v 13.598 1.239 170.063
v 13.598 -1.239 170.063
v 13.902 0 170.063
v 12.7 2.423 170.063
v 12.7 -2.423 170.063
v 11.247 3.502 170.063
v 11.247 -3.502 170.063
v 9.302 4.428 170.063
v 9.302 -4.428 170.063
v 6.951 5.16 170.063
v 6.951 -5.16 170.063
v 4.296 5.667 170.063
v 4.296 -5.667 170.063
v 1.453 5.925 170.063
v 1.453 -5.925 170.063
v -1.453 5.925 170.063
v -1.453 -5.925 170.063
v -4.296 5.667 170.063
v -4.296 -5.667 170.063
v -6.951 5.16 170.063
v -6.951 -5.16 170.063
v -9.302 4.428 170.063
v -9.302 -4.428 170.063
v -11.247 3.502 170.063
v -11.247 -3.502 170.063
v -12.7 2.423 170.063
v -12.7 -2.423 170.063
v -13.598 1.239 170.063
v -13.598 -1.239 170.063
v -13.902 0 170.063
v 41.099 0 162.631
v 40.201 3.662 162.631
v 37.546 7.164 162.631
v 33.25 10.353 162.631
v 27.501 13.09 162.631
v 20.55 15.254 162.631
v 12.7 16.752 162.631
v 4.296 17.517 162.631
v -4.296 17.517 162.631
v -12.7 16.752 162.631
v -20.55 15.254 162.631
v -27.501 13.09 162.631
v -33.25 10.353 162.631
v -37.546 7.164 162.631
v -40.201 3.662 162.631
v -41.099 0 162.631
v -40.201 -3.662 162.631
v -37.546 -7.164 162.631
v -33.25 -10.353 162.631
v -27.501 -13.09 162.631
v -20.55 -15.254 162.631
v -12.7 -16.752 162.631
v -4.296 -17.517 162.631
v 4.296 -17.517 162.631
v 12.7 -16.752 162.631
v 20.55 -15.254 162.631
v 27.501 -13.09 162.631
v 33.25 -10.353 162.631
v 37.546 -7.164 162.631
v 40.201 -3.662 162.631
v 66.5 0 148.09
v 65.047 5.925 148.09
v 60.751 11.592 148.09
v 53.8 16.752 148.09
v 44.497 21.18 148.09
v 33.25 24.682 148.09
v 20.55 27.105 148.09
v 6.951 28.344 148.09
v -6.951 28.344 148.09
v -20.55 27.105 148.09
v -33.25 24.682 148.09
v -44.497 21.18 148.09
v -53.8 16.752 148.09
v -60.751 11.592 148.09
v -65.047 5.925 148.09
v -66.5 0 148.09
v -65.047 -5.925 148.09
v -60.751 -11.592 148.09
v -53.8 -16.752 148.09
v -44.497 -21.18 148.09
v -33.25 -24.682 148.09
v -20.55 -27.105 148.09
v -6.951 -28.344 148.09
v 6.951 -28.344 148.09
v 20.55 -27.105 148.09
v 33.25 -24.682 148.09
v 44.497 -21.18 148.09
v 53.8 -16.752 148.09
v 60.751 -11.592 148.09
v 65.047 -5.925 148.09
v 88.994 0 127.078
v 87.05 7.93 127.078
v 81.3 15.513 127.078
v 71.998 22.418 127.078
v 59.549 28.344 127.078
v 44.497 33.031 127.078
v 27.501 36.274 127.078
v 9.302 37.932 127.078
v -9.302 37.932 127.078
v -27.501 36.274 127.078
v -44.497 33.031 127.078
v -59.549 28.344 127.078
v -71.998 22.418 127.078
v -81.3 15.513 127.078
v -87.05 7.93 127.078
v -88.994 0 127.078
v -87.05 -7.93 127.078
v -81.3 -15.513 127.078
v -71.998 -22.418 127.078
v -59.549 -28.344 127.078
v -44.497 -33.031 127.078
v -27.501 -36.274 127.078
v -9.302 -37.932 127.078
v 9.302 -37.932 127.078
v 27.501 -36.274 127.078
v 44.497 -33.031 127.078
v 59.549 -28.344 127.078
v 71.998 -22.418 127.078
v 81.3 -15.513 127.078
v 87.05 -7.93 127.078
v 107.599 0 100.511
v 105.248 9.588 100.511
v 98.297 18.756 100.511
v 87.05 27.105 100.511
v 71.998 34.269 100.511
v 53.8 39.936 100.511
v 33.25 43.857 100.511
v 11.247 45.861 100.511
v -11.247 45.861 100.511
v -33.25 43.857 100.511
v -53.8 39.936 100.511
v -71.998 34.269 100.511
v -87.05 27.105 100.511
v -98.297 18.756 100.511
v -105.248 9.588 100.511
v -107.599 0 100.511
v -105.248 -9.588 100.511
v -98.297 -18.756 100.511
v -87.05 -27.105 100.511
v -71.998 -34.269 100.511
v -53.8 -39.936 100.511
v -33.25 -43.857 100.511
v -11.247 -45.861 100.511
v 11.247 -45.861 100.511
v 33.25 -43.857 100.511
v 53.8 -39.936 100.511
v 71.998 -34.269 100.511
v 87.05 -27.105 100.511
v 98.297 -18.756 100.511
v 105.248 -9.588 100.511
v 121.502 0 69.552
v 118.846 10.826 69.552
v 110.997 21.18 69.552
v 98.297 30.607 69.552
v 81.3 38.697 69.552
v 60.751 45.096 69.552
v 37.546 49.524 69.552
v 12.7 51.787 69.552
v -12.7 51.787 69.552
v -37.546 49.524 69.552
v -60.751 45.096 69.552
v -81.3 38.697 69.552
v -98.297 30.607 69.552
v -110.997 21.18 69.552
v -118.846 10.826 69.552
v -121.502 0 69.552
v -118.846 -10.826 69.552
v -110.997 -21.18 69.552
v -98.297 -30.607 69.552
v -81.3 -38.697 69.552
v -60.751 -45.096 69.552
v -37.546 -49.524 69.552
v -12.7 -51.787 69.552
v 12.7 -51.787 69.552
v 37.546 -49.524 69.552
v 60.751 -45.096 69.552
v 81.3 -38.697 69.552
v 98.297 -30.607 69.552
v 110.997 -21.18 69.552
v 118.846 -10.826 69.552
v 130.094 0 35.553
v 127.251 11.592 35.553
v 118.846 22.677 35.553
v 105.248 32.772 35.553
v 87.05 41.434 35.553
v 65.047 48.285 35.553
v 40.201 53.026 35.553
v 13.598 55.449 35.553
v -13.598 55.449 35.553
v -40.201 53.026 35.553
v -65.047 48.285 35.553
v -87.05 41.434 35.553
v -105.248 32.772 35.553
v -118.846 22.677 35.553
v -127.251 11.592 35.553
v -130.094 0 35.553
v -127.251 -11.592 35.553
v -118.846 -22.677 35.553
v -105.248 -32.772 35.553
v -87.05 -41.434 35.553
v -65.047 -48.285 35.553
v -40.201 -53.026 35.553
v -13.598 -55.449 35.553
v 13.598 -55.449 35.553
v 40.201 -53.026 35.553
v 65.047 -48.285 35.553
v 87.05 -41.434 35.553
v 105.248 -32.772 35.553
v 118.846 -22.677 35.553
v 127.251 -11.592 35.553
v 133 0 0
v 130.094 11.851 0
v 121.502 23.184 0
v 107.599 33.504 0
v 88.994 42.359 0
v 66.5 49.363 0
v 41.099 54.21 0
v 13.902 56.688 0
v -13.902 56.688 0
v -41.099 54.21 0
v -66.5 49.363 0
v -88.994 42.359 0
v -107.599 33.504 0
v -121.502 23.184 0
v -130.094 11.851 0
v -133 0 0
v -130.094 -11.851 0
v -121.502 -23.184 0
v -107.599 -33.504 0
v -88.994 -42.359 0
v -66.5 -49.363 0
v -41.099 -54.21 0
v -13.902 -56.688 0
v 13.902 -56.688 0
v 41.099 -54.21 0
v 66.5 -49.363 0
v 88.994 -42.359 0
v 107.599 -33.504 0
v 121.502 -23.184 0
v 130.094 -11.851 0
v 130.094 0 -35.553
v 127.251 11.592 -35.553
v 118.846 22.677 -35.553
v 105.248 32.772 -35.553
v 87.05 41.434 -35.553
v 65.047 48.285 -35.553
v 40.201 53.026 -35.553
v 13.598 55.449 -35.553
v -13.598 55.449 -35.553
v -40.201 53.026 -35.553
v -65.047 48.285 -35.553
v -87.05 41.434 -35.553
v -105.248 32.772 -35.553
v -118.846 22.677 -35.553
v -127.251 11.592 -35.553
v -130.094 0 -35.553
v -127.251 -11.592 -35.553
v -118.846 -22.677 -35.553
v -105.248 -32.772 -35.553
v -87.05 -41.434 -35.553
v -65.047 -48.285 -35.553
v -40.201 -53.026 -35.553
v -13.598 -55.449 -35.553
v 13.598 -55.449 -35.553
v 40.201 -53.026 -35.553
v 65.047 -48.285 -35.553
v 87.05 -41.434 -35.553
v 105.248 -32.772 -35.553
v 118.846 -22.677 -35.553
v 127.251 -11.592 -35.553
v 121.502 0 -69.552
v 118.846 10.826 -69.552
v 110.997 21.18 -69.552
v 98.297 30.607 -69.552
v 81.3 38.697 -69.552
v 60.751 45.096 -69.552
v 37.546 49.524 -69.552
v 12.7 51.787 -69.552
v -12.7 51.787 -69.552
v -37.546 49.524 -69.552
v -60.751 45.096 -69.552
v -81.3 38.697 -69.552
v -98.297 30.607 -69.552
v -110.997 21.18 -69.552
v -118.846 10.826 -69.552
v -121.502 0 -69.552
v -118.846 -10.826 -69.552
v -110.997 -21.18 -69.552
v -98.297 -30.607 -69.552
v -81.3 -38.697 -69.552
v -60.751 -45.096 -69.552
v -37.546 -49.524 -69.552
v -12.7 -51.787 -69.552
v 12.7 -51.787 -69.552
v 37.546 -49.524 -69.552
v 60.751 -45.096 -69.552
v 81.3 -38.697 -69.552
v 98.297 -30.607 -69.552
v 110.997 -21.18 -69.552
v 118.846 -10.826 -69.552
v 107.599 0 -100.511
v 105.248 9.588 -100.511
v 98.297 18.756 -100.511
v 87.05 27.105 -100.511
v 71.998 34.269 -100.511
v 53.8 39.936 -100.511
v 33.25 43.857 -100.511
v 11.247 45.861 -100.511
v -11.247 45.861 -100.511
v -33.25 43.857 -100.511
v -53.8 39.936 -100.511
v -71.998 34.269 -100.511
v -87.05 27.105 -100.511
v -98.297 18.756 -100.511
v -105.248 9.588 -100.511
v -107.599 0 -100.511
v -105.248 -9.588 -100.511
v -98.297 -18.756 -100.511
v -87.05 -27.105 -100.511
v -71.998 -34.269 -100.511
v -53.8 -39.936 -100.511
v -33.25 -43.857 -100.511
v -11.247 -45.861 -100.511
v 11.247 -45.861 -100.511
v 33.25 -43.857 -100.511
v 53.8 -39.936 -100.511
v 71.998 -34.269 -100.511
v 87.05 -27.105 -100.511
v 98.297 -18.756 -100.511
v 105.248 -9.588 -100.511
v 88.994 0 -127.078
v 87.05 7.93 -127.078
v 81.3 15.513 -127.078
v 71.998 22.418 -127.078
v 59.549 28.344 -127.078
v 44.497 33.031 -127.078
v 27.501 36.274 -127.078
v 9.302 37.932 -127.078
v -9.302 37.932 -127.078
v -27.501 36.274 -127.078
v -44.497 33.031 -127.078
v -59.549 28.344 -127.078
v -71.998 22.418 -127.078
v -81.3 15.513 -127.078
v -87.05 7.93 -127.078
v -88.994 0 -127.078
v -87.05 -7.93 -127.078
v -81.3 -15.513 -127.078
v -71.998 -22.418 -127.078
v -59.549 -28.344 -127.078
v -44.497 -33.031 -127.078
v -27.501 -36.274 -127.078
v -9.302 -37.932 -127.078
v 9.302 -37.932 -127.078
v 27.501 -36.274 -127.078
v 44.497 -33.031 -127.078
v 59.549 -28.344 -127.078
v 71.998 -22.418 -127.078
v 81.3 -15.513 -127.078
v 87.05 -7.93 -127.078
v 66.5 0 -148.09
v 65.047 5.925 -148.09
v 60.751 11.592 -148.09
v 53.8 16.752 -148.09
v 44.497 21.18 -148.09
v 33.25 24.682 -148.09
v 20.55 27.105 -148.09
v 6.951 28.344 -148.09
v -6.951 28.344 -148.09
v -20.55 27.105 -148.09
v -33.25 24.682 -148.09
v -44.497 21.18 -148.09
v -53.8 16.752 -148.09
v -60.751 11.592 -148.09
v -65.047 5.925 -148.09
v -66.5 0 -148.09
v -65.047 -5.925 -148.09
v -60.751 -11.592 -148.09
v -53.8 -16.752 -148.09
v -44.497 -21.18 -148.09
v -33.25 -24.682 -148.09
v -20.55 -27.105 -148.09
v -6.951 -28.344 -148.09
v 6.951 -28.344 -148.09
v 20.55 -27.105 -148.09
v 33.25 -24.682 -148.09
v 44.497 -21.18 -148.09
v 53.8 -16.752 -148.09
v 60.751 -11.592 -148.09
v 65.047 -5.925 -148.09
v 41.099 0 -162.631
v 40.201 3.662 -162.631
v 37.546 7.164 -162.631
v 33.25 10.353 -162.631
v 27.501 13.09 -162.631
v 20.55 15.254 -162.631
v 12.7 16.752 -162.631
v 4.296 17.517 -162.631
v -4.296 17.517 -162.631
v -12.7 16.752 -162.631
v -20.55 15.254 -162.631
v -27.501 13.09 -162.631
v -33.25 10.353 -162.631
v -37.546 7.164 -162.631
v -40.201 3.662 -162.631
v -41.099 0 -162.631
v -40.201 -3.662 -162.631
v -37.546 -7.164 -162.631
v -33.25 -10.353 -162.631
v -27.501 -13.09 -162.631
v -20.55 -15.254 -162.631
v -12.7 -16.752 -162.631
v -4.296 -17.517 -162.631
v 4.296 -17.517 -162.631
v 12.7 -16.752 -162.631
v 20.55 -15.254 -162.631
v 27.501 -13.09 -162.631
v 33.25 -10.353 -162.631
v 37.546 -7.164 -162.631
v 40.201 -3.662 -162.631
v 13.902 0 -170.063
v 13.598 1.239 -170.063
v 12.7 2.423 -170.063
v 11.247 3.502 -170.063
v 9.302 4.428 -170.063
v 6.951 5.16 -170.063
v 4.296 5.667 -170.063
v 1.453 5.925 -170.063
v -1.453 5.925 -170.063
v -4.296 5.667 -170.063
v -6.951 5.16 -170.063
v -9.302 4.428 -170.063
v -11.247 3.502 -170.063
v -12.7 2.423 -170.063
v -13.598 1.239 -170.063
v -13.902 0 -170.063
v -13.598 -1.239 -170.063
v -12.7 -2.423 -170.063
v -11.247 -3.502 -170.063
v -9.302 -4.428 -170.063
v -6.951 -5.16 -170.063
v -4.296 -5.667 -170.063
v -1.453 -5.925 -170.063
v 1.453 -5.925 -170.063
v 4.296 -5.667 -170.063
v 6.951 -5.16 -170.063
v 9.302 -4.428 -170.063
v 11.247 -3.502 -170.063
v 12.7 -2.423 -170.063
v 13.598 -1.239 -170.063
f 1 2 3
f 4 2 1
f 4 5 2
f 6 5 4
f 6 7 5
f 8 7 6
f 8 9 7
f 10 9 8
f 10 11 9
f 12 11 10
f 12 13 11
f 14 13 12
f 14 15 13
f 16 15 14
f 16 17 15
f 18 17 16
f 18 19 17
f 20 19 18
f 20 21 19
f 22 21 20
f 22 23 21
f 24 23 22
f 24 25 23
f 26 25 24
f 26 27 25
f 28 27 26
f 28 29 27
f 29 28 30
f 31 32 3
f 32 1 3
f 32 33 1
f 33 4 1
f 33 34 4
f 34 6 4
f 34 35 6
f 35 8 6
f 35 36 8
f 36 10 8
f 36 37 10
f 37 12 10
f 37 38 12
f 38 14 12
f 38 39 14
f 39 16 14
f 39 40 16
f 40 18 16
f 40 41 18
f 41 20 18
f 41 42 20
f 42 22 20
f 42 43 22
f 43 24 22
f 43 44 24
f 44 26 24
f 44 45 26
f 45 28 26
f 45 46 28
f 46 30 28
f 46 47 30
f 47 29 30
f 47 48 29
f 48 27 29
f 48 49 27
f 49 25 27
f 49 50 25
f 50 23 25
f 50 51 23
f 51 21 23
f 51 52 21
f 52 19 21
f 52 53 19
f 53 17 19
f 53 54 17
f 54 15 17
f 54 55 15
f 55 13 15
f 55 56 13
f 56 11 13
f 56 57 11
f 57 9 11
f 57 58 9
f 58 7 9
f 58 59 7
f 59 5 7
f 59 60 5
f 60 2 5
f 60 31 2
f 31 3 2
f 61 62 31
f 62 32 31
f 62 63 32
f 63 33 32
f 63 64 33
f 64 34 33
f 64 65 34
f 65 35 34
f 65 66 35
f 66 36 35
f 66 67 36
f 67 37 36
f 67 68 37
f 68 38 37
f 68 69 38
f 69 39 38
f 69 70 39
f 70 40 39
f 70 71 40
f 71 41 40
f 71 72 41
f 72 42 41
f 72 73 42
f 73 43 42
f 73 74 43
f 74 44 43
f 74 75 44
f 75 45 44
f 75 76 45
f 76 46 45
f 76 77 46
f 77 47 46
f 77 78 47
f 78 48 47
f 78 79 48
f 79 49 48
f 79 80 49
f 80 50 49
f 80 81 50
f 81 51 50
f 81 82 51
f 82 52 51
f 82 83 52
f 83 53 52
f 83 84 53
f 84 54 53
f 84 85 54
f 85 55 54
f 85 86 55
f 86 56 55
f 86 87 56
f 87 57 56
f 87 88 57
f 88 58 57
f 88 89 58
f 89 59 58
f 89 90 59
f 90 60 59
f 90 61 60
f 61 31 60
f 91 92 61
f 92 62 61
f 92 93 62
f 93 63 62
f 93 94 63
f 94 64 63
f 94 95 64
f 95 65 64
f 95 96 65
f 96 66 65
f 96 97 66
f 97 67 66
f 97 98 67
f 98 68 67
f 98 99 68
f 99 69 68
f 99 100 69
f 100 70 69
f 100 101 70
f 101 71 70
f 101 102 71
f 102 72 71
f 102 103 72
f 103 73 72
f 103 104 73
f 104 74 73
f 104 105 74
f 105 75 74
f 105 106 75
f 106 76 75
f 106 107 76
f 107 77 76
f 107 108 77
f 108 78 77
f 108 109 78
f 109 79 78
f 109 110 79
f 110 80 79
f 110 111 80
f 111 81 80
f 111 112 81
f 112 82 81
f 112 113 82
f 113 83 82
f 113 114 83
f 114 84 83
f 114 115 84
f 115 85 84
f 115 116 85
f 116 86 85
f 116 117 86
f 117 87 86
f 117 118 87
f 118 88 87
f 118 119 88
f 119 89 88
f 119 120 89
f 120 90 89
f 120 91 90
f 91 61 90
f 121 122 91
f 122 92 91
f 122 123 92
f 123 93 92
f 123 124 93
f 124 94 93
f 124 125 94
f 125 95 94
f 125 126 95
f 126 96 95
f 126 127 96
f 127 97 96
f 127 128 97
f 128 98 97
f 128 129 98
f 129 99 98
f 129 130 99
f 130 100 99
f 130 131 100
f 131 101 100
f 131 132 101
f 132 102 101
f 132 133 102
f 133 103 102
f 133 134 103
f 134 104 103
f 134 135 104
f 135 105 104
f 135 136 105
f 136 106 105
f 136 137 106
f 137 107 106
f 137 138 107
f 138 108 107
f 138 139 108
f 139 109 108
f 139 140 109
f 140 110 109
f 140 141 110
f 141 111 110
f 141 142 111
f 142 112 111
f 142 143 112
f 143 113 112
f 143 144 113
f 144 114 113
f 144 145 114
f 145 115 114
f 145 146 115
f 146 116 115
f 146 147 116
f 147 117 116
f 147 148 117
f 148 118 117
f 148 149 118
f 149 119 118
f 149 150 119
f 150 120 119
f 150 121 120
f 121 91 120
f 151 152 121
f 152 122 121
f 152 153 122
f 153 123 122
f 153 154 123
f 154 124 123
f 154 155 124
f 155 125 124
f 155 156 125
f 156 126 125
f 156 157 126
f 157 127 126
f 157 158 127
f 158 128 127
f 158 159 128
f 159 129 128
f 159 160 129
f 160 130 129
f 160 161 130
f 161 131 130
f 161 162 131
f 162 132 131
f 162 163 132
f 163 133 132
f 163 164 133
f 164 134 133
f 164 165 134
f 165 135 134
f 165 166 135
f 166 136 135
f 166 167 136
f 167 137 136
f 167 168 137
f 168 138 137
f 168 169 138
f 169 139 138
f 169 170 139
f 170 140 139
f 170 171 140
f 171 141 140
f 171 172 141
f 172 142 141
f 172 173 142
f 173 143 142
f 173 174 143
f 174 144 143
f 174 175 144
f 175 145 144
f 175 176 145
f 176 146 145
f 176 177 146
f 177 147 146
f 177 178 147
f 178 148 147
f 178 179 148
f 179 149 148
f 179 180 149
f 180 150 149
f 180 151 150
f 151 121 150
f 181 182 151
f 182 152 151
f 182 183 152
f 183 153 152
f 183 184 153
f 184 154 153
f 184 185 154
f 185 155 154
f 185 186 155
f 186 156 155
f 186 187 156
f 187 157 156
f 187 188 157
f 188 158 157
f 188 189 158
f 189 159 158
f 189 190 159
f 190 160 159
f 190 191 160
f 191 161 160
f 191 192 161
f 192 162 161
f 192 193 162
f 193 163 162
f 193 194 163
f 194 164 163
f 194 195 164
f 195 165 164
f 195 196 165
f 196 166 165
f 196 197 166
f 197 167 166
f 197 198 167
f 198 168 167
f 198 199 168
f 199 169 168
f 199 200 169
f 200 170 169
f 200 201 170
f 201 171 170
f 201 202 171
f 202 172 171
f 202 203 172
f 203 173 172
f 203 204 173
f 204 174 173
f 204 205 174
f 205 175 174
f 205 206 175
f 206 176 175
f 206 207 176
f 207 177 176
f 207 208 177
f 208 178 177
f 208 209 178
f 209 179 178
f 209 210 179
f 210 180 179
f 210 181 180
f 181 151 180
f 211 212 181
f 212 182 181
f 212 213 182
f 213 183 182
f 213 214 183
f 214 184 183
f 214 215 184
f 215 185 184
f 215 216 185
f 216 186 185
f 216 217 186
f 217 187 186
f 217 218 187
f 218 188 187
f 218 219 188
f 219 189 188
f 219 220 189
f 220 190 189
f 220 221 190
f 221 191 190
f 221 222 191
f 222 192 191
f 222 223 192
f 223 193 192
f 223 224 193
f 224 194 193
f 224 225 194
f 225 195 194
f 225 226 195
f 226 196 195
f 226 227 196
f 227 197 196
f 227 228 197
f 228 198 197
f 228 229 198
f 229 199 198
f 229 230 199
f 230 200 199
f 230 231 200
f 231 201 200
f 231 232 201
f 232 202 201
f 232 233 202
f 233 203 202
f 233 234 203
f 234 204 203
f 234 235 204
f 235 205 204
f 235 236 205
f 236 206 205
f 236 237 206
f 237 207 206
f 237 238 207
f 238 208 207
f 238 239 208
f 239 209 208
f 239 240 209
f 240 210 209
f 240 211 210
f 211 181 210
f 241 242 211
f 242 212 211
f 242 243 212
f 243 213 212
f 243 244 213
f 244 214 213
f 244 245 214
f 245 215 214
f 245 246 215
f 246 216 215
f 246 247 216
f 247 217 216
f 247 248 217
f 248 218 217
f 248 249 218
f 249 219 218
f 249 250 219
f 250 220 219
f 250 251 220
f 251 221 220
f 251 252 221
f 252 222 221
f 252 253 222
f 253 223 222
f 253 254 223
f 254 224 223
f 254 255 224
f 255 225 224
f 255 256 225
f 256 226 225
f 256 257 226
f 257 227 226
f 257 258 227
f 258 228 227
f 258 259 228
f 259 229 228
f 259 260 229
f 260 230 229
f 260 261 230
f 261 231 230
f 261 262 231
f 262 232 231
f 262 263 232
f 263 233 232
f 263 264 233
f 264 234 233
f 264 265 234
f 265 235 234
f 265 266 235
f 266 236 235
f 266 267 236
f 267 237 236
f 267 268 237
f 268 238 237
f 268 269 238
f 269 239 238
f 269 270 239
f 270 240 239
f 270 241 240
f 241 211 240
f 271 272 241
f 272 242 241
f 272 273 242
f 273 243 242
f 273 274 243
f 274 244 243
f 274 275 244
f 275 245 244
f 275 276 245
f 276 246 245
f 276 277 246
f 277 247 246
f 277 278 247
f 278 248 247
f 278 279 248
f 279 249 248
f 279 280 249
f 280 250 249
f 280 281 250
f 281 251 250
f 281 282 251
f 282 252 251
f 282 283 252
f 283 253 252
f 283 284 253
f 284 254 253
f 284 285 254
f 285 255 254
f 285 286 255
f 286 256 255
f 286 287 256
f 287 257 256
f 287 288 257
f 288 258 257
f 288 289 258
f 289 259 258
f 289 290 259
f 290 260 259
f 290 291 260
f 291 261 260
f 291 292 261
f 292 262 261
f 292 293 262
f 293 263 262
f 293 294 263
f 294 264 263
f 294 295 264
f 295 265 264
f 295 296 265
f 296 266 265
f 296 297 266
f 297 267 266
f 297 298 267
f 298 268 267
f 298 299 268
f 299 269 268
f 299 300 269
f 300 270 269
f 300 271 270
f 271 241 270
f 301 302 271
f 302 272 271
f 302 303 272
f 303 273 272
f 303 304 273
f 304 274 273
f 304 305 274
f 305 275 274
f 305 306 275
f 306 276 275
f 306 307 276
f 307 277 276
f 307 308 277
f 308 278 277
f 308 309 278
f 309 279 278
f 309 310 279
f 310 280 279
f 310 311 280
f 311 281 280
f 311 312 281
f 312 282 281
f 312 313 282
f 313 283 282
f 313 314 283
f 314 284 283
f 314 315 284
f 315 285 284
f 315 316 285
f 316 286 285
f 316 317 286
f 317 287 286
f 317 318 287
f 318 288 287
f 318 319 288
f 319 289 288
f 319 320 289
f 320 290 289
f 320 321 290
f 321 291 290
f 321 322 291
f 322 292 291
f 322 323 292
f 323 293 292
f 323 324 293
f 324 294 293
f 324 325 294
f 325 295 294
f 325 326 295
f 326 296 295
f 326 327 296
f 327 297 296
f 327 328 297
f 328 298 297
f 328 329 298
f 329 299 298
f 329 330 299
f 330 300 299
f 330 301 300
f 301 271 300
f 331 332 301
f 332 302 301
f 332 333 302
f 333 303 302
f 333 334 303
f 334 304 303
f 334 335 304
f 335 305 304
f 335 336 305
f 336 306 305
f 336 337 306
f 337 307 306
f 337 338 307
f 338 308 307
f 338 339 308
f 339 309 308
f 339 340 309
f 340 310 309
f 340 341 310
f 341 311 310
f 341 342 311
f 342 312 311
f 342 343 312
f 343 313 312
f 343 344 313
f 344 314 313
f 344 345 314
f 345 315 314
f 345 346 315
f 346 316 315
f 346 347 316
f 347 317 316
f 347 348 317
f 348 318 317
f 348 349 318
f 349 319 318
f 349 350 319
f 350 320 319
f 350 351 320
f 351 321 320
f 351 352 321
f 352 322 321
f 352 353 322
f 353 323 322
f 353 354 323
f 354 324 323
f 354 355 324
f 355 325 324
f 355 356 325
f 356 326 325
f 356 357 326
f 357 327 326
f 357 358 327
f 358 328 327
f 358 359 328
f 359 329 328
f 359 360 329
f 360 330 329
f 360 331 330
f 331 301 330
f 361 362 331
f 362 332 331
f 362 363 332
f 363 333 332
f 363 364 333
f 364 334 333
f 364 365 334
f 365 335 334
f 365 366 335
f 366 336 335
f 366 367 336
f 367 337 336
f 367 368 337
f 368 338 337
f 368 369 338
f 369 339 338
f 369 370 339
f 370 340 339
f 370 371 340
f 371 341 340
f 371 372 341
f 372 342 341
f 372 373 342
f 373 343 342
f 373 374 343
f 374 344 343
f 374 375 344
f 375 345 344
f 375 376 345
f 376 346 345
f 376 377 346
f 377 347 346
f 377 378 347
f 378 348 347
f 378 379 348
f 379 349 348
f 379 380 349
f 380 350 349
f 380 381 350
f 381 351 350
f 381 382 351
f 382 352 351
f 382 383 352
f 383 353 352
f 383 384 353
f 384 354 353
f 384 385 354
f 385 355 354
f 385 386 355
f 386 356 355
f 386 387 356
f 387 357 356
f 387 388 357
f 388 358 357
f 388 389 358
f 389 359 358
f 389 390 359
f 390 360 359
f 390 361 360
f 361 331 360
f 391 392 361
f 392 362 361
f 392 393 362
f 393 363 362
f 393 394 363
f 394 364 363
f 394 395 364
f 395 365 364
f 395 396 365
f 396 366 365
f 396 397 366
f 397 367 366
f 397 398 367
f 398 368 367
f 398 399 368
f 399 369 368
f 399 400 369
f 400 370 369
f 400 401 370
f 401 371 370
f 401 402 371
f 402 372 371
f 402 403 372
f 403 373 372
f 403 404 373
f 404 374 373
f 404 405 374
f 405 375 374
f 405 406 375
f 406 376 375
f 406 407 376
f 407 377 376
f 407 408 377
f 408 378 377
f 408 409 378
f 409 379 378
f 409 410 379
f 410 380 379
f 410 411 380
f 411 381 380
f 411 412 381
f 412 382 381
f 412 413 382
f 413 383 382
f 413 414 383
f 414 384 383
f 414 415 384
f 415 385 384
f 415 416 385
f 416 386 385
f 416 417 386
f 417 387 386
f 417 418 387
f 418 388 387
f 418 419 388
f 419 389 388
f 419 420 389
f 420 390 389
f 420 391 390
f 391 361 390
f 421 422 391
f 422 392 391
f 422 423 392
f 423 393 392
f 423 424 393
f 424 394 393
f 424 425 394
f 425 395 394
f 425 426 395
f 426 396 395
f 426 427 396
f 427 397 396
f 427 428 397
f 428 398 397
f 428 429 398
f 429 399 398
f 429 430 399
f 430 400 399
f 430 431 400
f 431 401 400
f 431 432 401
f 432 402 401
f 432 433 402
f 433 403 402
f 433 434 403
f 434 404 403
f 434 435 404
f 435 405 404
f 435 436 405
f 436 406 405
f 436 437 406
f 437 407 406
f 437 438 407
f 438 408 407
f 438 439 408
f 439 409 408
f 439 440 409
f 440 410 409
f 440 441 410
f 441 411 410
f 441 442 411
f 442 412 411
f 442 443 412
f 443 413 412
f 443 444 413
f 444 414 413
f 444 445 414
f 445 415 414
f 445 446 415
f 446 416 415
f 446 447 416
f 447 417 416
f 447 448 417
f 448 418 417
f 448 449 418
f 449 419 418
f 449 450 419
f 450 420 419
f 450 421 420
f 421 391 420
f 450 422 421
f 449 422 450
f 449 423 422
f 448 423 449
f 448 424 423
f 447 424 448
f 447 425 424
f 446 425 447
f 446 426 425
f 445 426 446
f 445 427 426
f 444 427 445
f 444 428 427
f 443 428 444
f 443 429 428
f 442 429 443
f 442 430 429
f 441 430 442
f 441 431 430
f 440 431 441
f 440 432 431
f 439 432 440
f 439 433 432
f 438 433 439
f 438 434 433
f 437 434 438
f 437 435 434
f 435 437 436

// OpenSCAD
// Generated by SolidPython 1.0.1 on 2020-07-29 00:46:47


scale(v = [7, 3, 9]) {
	sphere(r = 19);
}
/***********************************************
*********      SolidPython code:      **********
************************************************
 
# import packages: SolidPython
from solid import *
from solid.utils import *
from itertools import chain, combinations, permutations


class Resize:

    def __init__(self, scad_file):
        self.scad_file = scad_file
        #self.scad_file = import_scad(scad_file)
        # cone/cylinder param:
        self.r1 = 0
        self.r2 = 0
        self.h = 0
        # rectangular prism param:
        self.w = 0
        self.l = 0
        # ellipse param:
        self.r = 0

    # import OpenScad code (file name corresponds to shape)


    # classify shape + parameters
    def assign(self, param1, param2, param3):
        if self.scad_file == 'cone.scad':
            self.r1 = param1
            self.r2 = param2
            self.h = param3
        elif self.scad_file == 'cylinder.scad':
            self.r1 = param1
            self.r2 = param2
            self.h = param3
        elif self.scad_file == 'rectangularPrism.scad':
            self.h = param1
            self.l = param2
            self.w = param3
        else:
            self.r = param1
            self.h = param2

    # resize parameters
    def iterate(self):
        x = range(3, 20, 2)
        i = 1
        if self.scad_file == 'cone.scad':
            tempList = list(permutations(x, 2))
            for temp in tempList:
                param1 = temp[0]
                param2 = temp[1]
                filepath = 'produced_scad_files/' + 'cone' + str(param1) + '_' + str(param2) + '_' + '.scad'
                scad_render_to_file(cylinder(h=param1, r1=param2, r2=0), filepath)

        elif self.scad_file == 'cylinder.scad':
            tempList = list(permutations(x, 3))
            for temp in tempList:
                param1 = temp[0]
                param2 = temp[1]
                filepath = 'produced_scad_files/' + 'cylinder' + str(param1) + '_' + str(param2) + '_' + '.scad'
                scad_render_to_file(cylinder(h=param1, r1=param2, r2=param2), filepath)

        elif self.scad_file == 'rectangularPrism.scad':
            tempList = list(permutations(x, 3))
            for temp in tempList:
                param1 = temp[0]
                param2 = temp[1]
                param3 = temp[2]
                filepath = 'produced_scad_files/' + 'rectangularPrism' + str(param1) + '_' + str(param2) + '_' + str(
                    param3) + '.scad'
                scad_render_to_file(cube(size=(param1, param2, param3)), filepath)

        elif self.scad_file == 'ellipse.scad':
            tempList = list(permutations(x, 4))
            for temp in tempList:
                param1 = temp[0]
                param2 = temp[1]
                param3 = temp[2]
                param4 = temp[3]
                filepath = 'produced_scad_files/' + 'ellipse' + str(param1) + '_' + str(param2) + '_' + str(param3) + '_' + str(param4) + '.scad'
                scad_render_to_file(scale([param1, param2, param3])(sphere(r=param4)), filepath)

    def render_to_scadfile(self):
        scad_render_to_file(scad, 'example.scad') 
 
************************************************/
